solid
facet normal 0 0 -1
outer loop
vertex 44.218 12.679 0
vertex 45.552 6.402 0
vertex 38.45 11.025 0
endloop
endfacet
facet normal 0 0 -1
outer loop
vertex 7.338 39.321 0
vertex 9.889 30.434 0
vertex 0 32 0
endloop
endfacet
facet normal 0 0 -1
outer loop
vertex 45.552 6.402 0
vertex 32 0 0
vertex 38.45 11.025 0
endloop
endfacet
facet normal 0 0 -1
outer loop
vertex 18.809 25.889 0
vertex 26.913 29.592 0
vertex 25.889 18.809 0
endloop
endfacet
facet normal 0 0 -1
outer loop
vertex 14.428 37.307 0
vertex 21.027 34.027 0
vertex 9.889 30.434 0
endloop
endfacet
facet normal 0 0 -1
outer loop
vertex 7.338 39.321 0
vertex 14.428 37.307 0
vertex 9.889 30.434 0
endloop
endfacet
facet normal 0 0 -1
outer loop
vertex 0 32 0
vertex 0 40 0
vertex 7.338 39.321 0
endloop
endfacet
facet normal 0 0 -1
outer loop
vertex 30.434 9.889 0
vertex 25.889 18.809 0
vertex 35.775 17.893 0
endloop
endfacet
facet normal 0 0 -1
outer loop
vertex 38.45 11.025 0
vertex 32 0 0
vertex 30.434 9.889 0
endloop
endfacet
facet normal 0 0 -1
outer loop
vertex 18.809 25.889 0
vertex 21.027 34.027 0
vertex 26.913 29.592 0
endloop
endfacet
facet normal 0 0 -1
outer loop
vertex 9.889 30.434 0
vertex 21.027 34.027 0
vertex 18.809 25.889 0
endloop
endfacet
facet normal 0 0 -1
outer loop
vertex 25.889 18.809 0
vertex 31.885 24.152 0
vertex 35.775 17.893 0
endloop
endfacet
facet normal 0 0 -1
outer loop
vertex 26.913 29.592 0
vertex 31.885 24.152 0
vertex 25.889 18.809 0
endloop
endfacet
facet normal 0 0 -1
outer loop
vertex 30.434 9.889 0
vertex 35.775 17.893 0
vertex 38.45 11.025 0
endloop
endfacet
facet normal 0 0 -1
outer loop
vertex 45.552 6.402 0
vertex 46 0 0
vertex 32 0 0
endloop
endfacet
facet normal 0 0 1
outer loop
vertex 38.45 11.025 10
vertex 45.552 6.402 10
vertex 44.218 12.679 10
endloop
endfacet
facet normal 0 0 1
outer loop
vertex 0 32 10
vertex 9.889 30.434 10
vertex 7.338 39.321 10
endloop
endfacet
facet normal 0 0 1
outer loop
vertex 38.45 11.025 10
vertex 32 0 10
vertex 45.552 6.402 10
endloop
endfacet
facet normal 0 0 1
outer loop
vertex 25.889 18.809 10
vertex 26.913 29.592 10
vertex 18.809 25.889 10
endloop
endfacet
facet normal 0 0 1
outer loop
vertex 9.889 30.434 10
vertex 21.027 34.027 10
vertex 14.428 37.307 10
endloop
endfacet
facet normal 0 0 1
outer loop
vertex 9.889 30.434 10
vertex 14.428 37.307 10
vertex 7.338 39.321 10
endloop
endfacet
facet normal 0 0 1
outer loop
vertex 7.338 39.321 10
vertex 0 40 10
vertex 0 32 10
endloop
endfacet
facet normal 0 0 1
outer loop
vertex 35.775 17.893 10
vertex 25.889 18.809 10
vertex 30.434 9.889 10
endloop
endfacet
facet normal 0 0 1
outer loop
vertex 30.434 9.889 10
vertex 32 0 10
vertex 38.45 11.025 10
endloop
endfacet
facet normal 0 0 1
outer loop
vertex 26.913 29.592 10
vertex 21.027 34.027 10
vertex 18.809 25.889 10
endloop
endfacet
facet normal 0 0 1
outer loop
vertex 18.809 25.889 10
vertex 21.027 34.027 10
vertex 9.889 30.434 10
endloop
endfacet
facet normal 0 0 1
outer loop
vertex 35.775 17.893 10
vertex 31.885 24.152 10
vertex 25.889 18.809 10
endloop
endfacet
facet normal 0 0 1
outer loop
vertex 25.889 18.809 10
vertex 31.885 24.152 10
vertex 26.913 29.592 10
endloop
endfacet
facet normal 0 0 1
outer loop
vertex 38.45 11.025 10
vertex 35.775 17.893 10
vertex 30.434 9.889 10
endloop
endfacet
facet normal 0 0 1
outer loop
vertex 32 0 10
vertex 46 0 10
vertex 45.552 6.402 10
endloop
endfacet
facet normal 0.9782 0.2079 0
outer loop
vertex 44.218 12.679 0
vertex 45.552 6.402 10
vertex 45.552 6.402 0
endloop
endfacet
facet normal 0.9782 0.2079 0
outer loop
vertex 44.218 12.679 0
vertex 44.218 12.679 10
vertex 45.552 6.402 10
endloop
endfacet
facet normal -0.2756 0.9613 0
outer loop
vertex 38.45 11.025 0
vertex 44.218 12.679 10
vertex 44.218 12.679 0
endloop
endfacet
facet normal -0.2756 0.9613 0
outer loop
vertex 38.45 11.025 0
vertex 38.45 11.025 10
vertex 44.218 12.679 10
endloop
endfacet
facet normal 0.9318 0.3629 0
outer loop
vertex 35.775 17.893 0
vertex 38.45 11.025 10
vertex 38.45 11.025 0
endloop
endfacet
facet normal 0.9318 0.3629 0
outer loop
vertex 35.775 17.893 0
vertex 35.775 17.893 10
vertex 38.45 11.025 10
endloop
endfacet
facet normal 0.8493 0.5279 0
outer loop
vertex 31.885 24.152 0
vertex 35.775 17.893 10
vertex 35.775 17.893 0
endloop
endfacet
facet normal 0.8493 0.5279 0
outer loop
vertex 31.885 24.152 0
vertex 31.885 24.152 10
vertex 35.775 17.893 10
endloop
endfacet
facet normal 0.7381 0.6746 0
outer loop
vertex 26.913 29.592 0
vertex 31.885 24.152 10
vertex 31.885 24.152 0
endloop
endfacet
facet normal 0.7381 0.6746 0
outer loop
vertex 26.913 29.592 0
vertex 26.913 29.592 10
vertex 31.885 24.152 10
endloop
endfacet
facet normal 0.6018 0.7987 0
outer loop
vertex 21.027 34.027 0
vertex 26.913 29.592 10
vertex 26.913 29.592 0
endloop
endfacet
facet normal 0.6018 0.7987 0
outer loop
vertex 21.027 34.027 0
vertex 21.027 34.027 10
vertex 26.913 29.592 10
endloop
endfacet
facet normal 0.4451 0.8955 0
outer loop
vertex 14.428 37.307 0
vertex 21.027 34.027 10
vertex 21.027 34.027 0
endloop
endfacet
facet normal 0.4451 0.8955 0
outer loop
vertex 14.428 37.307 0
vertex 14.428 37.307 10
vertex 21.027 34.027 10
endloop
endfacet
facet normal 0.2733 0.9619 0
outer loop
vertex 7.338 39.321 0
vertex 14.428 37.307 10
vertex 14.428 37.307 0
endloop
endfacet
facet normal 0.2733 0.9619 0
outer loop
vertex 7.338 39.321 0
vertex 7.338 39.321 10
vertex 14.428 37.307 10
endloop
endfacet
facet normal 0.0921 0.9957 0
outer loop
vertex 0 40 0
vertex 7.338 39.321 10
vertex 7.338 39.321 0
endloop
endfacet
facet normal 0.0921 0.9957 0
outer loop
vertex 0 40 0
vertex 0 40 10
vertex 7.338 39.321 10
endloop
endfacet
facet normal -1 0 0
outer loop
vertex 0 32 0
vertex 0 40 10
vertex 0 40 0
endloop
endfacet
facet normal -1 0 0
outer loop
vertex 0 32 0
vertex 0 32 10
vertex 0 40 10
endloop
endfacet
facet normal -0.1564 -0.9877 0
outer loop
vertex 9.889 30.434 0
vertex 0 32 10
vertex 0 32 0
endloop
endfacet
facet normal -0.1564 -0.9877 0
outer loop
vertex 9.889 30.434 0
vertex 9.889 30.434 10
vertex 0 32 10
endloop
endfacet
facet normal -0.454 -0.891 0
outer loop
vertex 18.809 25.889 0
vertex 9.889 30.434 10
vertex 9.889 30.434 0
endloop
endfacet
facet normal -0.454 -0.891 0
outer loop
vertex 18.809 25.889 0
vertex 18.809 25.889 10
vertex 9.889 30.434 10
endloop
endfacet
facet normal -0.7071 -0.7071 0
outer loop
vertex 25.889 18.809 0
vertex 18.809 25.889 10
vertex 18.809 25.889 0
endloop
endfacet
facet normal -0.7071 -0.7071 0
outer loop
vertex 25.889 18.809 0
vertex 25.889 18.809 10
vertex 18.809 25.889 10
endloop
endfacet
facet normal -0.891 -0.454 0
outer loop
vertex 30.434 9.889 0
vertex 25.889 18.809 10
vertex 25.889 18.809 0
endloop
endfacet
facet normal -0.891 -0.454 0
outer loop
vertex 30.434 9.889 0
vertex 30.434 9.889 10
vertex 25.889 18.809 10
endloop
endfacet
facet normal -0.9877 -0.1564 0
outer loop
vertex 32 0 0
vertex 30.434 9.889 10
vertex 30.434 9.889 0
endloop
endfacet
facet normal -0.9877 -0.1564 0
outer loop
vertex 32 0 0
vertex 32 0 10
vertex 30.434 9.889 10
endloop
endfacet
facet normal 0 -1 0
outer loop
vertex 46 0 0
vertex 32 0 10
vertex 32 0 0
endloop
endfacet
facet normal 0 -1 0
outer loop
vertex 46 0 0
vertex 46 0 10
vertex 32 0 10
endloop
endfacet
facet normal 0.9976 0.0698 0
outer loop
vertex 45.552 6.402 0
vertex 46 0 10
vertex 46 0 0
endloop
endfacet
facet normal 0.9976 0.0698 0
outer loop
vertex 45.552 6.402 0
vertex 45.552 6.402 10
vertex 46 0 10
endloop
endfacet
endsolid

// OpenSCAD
$fn = 32;

// ----------------------------------------------------------------------
// Arc stop: segment, 10 mm thick
// ----------------------------------------------------------------------

// --- parameters (mm) ---
profile_height = 10;      // extrusion height
profile_points = 17;      // points of the closed outline

profile = [[46, 0], [45.552, 6.402], [44.218, 12.679], [38.45, 11.025], [35.775, 17.893], [31.885, 24.152], [26.913, 29.592], [21.027, 34.027], [14.428, 37.307], [7.338, 39.321], [0, 40], [0, 32], [9.889, 30.434], [18.809, 25.889], [25.889, 18.809], [30.434, 9.889], [32, 0]];  // single closed polygon, 17 points, counter clockwise

// --- the one profile operation ---
linear_extrude(height = profile_height) polygon(points = profile);
